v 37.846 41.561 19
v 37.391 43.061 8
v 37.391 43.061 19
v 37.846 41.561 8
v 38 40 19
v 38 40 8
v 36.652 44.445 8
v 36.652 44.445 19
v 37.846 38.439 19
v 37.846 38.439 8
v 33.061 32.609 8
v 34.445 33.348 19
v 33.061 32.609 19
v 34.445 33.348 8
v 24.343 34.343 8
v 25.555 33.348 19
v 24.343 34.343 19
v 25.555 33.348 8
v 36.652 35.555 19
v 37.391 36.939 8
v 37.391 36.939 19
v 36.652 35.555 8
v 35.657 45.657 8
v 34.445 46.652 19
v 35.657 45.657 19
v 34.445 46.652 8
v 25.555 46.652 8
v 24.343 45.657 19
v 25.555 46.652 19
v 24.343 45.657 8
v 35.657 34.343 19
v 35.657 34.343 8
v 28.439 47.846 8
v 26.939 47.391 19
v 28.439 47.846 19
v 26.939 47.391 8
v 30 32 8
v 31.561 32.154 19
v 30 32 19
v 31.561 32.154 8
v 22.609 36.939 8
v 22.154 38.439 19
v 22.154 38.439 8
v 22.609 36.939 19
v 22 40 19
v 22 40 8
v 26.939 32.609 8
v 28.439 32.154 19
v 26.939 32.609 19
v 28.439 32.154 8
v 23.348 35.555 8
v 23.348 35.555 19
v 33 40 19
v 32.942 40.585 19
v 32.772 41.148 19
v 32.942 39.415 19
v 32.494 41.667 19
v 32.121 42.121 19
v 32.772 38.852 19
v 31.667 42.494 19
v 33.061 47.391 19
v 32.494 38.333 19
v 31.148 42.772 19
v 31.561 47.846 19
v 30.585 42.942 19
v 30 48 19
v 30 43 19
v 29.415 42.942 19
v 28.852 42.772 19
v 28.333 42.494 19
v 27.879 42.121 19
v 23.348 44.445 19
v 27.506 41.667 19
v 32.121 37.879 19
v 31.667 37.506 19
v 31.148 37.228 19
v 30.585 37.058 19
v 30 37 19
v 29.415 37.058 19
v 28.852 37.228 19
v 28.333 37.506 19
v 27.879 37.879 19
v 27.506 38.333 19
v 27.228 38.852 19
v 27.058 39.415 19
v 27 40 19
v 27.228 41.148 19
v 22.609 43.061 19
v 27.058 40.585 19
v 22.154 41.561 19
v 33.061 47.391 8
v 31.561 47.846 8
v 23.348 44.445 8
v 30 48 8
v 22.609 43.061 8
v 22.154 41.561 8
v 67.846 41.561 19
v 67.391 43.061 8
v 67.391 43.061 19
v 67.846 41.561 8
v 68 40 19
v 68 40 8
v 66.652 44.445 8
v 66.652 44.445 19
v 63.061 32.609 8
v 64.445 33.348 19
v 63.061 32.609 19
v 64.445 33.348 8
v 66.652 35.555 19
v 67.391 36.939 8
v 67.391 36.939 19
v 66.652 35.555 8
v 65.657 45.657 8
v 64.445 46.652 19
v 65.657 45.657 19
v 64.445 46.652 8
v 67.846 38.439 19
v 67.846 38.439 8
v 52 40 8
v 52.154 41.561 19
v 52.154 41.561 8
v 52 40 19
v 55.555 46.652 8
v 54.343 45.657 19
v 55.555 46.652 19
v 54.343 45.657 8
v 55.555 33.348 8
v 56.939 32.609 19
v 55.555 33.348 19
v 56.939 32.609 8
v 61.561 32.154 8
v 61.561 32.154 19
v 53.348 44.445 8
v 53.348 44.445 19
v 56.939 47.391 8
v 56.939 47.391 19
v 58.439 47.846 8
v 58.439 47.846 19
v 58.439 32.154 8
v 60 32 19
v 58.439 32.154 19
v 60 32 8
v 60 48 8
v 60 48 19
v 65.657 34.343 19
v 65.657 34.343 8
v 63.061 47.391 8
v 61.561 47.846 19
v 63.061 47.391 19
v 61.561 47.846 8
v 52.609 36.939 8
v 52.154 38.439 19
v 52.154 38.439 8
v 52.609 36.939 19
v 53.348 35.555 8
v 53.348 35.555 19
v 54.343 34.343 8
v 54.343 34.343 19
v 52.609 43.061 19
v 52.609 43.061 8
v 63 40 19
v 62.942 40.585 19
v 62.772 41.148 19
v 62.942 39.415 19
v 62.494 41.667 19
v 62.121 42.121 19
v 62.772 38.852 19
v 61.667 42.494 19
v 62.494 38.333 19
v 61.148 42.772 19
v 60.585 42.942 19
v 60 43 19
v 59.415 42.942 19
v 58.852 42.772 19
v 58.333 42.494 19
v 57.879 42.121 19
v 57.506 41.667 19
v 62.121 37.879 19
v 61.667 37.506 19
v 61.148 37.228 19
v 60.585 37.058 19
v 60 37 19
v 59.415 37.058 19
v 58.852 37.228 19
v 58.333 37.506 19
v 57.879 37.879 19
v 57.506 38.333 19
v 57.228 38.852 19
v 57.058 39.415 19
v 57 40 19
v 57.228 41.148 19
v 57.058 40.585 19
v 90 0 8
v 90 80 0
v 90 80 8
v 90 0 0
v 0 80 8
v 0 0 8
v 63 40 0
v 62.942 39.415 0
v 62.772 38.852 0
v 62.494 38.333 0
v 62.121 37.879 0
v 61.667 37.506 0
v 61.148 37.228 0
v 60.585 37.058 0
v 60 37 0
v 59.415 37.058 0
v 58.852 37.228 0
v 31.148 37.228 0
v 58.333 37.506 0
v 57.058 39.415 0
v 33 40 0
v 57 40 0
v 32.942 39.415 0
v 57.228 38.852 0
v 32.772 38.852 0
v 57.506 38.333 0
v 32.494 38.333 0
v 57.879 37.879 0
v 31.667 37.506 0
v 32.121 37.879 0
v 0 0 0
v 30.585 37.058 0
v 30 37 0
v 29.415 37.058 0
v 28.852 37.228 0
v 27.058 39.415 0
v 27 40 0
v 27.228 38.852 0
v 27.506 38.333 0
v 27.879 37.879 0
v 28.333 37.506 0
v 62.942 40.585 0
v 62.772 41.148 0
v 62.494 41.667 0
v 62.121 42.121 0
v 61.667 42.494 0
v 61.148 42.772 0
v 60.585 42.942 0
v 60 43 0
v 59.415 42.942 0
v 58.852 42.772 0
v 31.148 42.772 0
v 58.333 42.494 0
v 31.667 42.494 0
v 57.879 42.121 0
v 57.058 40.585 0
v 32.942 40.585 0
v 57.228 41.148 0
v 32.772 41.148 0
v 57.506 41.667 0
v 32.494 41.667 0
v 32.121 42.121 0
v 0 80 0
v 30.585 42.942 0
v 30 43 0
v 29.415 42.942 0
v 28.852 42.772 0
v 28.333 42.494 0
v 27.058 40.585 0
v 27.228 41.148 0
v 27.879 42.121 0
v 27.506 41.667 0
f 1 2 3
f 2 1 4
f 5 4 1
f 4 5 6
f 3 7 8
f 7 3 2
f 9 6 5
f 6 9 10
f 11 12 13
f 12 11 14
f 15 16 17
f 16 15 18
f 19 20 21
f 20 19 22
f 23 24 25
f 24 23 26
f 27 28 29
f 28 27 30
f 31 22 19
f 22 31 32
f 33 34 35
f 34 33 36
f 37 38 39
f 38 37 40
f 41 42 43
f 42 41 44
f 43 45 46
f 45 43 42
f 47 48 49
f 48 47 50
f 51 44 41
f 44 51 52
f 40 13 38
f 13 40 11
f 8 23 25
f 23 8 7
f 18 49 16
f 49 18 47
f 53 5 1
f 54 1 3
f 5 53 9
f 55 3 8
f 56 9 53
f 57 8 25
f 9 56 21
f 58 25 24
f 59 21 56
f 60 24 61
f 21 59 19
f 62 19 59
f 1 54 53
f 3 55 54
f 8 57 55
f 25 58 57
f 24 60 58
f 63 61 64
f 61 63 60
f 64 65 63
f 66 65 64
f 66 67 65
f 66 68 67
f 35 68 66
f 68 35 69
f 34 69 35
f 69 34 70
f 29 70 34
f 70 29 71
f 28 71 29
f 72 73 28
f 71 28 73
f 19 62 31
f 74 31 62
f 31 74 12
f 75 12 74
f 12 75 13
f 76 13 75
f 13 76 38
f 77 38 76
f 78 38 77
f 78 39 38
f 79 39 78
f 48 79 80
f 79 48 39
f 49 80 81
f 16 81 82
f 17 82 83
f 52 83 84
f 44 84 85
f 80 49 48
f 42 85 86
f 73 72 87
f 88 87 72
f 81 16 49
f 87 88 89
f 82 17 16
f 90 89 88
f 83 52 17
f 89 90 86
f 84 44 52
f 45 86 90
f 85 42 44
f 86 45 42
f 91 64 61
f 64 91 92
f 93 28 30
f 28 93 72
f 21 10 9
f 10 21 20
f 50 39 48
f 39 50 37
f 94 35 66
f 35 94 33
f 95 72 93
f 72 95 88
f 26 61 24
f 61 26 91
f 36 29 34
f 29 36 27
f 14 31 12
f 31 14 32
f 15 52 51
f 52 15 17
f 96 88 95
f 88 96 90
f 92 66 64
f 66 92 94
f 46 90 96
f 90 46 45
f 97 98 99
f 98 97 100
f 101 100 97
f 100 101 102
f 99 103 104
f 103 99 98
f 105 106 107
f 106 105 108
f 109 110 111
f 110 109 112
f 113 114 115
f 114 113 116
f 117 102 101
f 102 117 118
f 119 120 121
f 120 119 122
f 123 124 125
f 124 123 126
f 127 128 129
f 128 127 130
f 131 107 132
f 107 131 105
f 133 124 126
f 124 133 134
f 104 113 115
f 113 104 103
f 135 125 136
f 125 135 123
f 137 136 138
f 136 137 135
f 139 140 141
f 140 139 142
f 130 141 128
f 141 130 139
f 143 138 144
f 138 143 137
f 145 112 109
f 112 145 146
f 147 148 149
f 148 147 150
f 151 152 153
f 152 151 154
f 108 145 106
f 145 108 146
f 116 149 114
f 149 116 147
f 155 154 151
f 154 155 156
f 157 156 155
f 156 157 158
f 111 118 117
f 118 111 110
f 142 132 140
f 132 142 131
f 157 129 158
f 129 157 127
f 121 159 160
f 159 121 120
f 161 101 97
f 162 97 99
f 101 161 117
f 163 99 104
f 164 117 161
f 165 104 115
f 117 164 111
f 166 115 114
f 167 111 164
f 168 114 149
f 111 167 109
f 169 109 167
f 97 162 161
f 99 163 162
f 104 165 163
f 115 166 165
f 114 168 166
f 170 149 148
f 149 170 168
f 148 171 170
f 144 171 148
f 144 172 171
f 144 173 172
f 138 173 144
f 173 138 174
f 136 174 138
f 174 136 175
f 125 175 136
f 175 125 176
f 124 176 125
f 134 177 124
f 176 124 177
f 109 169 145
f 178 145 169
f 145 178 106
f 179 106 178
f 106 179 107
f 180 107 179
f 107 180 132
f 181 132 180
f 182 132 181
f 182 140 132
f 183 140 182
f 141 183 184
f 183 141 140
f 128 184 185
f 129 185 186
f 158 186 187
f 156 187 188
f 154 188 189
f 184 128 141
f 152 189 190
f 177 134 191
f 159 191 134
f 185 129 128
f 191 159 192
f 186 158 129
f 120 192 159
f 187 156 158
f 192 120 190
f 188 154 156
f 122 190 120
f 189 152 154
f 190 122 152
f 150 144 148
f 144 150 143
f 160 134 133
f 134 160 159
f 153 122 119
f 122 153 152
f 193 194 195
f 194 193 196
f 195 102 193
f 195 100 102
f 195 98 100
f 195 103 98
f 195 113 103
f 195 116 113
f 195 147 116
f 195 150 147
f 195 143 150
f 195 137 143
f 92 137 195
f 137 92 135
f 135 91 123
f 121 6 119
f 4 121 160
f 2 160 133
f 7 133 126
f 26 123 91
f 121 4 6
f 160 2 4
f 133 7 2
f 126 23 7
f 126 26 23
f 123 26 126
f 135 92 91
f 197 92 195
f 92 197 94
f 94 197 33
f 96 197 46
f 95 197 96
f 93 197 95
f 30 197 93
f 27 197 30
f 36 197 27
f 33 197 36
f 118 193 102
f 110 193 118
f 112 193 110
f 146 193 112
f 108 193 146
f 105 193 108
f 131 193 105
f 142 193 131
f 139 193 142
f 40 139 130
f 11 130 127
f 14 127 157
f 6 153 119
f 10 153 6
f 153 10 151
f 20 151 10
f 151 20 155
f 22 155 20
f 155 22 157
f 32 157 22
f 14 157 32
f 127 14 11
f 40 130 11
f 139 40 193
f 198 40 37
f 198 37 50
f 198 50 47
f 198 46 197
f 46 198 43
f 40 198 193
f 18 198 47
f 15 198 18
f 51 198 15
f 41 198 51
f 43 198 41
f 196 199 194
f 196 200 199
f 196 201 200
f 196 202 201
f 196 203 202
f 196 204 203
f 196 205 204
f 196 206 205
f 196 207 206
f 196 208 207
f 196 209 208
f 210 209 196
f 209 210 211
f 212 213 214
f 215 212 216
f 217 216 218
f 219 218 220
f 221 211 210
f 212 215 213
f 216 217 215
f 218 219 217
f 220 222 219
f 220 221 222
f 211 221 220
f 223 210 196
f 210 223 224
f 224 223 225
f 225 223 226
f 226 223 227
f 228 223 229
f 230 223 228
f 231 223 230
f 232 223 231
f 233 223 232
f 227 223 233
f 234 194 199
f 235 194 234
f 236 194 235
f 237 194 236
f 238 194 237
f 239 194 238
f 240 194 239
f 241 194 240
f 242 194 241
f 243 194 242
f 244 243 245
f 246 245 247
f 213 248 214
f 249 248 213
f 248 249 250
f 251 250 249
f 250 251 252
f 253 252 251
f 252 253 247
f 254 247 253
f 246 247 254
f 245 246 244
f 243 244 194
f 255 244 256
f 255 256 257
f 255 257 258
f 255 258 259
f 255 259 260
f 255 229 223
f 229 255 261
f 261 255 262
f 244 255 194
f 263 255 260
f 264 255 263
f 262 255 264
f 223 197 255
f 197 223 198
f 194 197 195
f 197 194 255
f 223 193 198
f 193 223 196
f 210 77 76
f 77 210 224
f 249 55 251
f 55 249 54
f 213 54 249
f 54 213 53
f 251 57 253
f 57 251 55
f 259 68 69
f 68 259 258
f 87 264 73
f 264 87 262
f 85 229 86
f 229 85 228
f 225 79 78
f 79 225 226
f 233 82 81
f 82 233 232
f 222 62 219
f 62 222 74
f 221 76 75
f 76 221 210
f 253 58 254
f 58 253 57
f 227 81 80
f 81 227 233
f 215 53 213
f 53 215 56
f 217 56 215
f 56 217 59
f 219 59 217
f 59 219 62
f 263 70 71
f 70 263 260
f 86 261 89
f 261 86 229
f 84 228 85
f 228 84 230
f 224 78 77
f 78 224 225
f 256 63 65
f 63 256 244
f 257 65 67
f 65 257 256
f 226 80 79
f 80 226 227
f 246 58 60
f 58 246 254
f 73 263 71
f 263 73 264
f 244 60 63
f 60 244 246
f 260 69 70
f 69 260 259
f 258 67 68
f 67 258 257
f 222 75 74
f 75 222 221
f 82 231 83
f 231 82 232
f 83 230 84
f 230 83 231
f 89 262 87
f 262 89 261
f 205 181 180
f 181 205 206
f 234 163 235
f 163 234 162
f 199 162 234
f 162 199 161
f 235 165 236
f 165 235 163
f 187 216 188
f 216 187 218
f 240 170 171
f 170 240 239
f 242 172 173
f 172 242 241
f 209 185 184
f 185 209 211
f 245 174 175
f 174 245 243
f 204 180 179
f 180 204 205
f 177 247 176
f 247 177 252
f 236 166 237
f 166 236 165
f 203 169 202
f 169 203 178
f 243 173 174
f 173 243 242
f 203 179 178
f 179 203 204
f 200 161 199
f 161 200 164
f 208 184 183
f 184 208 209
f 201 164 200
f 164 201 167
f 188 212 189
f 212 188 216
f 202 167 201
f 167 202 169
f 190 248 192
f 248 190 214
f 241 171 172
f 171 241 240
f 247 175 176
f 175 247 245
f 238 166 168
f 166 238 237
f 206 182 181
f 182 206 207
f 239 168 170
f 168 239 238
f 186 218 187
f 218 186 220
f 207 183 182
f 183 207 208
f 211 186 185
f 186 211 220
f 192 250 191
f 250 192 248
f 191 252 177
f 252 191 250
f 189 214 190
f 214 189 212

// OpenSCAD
$fn = 32;

// ----------------------------------------------------------------------
// Drill jig: two_boss jig
// ----------------------------------------------------------------------

// --- parameters (mm) ---
plate_l = 90;             // plate length, X
plate_w = 80;             // plate width, Y
plate_t = 8;              // plate thickness
boss_d = 16;              // guide boss diameter
boss_h = 12;              // boss height above the plate
guide_d = 6;              // guide hole diameter
boss_pitch = 30;          // boss pitch

n_boss = 2;  // guide bosses
boss_x0 = (plate_l - (n_boss - 1) * boss_pitch) / 2;  // first boss X
boss_top = plate_t - 1 + boss_h;  // boss crown height
total_h = boss_top;  // overall height

difference() {
  union() {
  cube([plate_l, plate_w, plate_t]);
  for (i = [0 : n_boss - 1])
    translate([boss_x0 + i * boss_pitch, plate_w / 2, plate_t - 1])
      cylinder(h = boss_h, d = boss_d);
  }
  for (i = [0 : n_boss - 1])
    translate([boss_x0 + i * boss_pitch, plate_w / 2, -1])
      cylinder(h = plate_t + boss_h, d = guide_d);
}
